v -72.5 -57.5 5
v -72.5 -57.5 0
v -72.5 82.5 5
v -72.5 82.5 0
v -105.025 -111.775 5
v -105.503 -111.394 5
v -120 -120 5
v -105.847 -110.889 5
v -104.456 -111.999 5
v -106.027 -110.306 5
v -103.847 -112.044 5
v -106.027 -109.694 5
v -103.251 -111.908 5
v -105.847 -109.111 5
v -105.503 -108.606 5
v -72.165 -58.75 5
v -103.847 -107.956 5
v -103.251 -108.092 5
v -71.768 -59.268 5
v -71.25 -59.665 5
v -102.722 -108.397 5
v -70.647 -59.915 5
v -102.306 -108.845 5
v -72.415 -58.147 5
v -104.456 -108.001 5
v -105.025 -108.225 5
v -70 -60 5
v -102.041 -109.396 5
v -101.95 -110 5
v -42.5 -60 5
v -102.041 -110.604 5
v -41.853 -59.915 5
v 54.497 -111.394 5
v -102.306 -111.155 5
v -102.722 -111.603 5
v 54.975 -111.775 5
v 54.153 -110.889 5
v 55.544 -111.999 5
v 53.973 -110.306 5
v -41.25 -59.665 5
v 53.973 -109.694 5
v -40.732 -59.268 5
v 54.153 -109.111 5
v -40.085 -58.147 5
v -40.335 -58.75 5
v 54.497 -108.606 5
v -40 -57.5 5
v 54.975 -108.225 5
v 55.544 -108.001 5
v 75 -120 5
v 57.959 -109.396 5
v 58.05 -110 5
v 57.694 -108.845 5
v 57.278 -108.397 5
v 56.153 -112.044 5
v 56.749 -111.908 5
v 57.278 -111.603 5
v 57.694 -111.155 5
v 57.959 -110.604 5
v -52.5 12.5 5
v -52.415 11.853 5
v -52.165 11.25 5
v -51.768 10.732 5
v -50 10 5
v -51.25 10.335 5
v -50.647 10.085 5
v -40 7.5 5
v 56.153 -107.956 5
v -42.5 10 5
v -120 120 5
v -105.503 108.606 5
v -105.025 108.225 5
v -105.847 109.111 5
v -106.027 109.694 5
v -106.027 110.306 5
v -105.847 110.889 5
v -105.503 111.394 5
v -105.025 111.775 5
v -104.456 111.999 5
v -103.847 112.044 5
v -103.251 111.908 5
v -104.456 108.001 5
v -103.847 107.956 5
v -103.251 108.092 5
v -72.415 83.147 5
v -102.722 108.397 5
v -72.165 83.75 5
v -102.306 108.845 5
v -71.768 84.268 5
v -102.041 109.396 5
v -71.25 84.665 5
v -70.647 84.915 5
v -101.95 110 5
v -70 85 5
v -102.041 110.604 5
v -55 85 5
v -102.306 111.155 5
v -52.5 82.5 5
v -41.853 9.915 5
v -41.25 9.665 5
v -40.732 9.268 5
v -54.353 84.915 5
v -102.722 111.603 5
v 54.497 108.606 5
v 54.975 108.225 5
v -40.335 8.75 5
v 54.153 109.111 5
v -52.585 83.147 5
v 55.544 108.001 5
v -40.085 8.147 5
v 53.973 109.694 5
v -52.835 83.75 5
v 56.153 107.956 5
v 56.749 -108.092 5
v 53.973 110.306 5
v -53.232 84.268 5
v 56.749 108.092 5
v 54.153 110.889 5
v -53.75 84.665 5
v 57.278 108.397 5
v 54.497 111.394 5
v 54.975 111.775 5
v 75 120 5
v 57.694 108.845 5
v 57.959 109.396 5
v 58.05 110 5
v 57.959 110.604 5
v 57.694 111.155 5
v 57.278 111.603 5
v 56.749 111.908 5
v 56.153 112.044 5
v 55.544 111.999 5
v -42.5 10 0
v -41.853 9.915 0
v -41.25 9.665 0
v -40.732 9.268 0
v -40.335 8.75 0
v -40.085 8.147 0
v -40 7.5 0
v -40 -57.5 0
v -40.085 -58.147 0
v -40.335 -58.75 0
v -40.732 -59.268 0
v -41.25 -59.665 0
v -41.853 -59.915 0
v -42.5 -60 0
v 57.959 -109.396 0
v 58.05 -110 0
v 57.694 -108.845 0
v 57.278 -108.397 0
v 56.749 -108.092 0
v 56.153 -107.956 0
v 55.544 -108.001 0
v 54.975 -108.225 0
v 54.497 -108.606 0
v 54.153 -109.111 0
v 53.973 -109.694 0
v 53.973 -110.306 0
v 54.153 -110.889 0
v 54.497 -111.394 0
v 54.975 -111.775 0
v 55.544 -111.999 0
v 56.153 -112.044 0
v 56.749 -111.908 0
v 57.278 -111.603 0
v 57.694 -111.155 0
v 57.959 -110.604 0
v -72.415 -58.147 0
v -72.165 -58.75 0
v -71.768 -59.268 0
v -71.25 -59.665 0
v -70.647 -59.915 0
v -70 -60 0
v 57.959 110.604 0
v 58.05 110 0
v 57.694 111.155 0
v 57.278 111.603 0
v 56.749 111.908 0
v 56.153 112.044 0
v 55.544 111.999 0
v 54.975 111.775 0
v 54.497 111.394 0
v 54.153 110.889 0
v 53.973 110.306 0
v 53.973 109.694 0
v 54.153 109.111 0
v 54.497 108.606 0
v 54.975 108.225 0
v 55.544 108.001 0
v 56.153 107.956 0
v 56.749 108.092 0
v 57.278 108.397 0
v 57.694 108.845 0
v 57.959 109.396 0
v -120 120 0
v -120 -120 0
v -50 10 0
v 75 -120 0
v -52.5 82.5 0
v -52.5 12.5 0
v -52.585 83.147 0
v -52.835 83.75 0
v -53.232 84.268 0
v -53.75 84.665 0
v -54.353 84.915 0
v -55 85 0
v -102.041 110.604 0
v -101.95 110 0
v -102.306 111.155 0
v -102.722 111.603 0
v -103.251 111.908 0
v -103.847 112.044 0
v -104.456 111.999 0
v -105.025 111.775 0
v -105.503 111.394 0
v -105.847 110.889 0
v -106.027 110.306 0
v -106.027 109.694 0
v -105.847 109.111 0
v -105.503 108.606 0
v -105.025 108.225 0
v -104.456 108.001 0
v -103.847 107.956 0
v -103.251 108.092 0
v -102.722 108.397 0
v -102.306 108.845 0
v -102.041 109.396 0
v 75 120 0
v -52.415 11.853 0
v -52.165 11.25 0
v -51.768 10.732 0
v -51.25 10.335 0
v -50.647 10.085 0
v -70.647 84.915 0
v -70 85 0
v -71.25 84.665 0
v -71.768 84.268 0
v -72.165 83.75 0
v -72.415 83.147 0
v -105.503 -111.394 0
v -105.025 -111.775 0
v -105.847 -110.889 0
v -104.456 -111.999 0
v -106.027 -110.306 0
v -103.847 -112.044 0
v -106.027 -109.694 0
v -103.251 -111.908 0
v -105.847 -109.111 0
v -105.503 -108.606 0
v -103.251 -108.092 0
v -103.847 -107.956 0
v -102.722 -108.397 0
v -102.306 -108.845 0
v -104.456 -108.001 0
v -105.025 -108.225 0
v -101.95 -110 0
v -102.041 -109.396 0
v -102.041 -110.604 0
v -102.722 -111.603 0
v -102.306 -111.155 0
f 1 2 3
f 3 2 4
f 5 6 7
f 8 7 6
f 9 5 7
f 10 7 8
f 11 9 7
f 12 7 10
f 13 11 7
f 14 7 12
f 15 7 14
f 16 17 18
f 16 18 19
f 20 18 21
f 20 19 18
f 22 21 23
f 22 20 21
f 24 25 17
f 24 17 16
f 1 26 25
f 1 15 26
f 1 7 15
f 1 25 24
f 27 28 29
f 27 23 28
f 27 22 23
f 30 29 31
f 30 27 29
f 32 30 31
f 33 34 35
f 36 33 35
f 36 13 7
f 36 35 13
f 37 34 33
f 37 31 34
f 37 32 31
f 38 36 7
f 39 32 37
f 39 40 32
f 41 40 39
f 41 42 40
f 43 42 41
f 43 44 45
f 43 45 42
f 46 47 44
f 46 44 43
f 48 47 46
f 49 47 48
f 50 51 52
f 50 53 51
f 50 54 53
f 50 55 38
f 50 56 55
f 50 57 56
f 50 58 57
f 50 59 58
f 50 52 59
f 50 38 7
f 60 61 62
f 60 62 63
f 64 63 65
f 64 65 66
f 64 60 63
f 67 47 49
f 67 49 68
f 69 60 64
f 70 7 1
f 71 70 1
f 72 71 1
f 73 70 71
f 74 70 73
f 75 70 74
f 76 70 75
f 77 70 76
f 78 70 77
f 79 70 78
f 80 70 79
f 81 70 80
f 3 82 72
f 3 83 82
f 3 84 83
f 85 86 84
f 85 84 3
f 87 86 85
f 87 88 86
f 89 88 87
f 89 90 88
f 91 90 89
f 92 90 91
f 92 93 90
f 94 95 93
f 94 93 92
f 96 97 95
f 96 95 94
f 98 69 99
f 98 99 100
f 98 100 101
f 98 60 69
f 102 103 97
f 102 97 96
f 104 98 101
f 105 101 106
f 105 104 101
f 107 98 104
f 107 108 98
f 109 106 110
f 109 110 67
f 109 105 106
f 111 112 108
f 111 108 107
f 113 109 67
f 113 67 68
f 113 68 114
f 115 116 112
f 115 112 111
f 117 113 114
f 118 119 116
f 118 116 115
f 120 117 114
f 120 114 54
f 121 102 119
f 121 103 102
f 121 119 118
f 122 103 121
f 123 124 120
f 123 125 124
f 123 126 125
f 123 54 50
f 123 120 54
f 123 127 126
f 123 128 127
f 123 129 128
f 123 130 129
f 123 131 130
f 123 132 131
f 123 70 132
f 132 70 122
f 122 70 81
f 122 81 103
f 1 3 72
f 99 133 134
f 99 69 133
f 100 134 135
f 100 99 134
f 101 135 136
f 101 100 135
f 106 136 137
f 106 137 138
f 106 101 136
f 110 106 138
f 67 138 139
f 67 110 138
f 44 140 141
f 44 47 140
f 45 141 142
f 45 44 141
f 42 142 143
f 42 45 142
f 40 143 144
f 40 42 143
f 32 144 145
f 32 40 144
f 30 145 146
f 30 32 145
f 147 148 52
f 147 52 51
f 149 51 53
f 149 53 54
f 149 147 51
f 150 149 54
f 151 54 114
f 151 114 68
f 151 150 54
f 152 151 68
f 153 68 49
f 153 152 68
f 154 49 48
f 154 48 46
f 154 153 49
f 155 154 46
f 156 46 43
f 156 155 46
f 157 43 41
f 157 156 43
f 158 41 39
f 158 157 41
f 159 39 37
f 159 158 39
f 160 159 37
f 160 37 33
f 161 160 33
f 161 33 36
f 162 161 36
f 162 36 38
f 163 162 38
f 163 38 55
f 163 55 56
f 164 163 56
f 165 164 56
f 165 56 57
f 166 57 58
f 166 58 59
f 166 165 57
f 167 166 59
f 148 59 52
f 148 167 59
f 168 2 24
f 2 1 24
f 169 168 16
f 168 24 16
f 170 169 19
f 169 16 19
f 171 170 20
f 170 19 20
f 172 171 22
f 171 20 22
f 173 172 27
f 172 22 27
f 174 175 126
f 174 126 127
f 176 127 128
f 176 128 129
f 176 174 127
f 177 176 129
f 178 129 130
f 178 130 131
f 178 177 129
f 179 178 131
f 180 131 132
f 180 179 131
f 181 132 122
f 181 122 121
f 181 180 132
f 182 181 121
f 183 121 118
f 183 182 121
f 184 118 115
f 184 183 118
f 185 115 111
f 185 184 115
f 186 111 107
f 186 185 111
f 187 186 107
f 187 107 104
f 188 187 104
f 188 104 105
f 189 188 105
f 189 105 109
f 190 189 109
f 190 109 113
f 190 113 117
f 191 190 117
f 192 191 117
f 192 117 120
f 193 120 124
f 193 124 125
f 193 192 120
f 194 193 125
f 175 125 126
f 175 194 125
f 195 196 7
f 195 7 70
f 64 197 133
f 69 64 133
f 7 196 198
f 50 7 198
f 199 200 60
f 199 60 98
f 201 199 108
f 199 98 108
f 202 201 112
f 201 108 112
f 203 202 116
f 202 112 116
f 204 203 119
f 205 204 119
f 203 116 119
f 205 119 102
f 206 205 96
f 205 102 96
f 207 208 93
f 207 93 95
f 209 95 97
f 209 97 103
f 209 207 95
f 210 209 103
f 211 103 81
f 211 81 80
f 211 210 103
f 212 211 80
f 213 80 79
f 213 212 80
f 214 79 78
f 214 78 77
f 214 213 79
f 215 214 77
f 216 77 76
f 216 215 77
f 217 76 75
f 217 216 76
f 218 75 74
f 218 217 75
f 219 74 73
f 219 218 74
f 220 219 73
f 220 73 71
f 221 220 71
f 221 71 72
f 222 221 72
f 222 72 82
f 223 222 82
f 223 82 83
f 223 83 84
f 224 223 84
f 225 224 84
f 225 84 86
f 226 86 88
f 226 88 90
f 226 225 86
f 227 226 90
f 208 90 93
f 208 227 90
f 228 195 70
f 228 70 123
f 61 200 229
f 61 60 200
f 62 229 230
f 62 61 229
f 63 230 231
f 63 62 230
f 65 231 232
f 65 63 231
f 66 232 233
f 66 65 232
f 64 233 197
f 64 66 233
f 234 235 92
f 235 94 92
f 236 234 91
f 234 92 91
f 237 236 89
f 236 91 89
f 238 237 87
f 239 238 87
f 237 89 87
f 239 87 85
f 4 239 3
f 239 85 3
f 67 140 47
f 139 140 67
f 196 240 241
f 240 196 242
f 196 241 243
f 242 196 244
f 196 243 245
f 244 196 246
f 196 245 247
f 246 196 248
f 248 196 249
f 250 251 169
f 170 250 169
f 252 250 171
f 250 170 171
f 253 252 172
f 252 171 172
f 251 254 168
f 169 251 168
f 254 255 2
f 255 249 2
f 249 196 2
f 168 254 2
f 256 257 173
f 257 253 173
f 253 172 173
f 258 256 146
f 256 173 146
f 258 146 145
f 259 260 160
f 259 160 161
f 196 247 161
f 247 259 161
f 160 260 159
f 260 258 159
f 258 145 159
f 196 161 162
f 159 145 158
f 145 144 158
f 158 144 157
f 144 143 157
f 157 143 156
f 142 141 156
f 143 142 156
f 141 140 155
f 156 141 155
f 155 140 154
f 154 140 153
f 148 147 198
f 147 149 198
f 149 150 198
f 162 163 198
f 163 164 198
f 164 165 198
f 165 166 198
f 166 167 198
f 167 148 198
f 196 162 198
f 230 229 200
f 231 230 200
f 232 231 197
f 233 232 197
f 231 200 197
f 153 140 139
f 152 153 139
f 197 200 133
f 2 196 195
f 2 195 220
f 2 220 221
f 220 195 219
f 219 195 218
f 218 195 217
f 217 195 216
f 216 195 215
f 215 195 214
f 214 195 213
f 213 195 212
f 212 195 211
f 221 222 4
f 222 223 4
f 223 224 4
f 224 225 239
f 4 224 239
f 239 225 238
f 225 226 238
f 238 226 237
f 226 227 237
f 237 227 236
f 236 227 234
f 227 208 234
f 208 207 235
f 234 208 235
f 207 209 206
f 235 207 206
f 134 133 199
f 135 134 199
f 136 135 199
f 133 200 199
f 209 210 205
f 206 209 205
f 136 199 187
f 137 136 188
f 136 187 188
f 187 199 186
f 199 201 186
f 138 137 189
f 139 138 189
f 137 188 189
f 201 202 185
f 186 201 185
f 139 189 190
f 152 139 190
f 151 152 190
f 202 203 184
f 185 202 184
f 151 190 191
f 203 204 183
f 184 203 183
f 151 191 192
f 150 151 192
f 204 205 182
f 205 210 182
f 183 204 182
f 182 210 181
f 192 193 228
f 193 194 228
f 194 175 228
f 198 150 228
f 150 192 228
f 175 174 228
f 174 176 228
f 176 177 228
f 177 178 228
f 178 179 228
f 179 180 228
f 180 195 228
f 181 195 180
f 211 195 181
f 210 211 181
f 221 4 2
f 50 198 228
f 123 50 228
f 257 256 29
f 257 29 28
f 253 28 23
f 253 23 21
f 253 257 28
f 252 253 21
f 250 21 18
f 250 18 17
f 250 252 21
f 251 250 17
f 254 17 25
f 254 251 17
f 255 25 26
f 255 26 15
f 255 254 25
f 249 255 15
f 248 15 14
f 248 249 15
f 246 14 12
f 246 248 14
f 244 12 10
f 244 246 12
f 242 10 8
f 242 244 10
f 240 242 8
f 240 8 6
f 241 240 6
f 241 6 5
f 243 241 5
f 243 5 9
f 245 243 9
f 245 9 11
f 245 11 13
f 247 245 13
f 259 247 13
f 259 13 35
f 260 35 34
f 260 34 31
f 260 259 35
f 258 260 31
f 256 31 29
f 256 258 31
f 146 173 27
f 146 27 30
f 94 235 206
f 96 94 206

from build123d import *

# Parameters (mm, degrees)
ESQUISSE1_W        = 195
ESQUISSE1_H        = 240
ESQUISSE1_R        = 2.05
ESQUISSE1_W_2      = 32.5
ESQUISSE1_H_2      = 145
ESQUISSE1_W_3      = 12.5
ESQUISSE1_H_3      = 75
BOSS_EXTRU_1_DEPTH = 5
CONG_1_R           = 2.5


with BuildPart() as part:
    # Esquisse1 → Boss.-Extru.1 (new body)
    # profile 1 of 2: a face of its own
    with BuildSketch(Plane.XY):
        with Locations((-22.5, 0)):
            Rectangle(ESQUISSE1_W, ESQUISSE1_H)
        with Locations((56, -110)):
            Circle(ESQUISSE1_R, mode=Mode.SUBTRACT)
        with Locations((56, 110)):
            Circle(ESQUISSE1_R, mode=Mode.SUBTRACT)
        with Locations((-104, 110)):
            Circle(ESQUISSE1_R, mode=Mode.SUBTRACT)
        with Locations((-104, -110)):
            Circle(ESQUISSE1_R, mode=Mode.SUBTRACT)
        with Locations((-56.25, 12.5)):
            Rectangle(ESQUISSE1_W_2, ESQUISSE1_H_2, mode=Mode.SUBTRACT)
    # profile 2 of 2: a face of its own
    with BuildSketch(Plane.XY):
        with Locations((-46.25, 47.5)):
            Rectangle(ESQUISSE1_W_3, ESQUISSE1_H_3)
    extrude(amount=BOSS_EXTRU_1_DEPTH)

    # Congé1
    cong_1_edges = [part.edges().sort_by_distance(p)[0] for p in [
        (-72.5, 85, 2.5),
        (-72.5, -60, 2.5),
        (-40, -60, 2.5),
        (-40, 10, 2.5),
        (-52.5, 10, 2.5),
        (-52.5, 85, 2.5),
    ]]
    fillet(cong_1_edges, radius=CONG_1_R)


solid = part.part
